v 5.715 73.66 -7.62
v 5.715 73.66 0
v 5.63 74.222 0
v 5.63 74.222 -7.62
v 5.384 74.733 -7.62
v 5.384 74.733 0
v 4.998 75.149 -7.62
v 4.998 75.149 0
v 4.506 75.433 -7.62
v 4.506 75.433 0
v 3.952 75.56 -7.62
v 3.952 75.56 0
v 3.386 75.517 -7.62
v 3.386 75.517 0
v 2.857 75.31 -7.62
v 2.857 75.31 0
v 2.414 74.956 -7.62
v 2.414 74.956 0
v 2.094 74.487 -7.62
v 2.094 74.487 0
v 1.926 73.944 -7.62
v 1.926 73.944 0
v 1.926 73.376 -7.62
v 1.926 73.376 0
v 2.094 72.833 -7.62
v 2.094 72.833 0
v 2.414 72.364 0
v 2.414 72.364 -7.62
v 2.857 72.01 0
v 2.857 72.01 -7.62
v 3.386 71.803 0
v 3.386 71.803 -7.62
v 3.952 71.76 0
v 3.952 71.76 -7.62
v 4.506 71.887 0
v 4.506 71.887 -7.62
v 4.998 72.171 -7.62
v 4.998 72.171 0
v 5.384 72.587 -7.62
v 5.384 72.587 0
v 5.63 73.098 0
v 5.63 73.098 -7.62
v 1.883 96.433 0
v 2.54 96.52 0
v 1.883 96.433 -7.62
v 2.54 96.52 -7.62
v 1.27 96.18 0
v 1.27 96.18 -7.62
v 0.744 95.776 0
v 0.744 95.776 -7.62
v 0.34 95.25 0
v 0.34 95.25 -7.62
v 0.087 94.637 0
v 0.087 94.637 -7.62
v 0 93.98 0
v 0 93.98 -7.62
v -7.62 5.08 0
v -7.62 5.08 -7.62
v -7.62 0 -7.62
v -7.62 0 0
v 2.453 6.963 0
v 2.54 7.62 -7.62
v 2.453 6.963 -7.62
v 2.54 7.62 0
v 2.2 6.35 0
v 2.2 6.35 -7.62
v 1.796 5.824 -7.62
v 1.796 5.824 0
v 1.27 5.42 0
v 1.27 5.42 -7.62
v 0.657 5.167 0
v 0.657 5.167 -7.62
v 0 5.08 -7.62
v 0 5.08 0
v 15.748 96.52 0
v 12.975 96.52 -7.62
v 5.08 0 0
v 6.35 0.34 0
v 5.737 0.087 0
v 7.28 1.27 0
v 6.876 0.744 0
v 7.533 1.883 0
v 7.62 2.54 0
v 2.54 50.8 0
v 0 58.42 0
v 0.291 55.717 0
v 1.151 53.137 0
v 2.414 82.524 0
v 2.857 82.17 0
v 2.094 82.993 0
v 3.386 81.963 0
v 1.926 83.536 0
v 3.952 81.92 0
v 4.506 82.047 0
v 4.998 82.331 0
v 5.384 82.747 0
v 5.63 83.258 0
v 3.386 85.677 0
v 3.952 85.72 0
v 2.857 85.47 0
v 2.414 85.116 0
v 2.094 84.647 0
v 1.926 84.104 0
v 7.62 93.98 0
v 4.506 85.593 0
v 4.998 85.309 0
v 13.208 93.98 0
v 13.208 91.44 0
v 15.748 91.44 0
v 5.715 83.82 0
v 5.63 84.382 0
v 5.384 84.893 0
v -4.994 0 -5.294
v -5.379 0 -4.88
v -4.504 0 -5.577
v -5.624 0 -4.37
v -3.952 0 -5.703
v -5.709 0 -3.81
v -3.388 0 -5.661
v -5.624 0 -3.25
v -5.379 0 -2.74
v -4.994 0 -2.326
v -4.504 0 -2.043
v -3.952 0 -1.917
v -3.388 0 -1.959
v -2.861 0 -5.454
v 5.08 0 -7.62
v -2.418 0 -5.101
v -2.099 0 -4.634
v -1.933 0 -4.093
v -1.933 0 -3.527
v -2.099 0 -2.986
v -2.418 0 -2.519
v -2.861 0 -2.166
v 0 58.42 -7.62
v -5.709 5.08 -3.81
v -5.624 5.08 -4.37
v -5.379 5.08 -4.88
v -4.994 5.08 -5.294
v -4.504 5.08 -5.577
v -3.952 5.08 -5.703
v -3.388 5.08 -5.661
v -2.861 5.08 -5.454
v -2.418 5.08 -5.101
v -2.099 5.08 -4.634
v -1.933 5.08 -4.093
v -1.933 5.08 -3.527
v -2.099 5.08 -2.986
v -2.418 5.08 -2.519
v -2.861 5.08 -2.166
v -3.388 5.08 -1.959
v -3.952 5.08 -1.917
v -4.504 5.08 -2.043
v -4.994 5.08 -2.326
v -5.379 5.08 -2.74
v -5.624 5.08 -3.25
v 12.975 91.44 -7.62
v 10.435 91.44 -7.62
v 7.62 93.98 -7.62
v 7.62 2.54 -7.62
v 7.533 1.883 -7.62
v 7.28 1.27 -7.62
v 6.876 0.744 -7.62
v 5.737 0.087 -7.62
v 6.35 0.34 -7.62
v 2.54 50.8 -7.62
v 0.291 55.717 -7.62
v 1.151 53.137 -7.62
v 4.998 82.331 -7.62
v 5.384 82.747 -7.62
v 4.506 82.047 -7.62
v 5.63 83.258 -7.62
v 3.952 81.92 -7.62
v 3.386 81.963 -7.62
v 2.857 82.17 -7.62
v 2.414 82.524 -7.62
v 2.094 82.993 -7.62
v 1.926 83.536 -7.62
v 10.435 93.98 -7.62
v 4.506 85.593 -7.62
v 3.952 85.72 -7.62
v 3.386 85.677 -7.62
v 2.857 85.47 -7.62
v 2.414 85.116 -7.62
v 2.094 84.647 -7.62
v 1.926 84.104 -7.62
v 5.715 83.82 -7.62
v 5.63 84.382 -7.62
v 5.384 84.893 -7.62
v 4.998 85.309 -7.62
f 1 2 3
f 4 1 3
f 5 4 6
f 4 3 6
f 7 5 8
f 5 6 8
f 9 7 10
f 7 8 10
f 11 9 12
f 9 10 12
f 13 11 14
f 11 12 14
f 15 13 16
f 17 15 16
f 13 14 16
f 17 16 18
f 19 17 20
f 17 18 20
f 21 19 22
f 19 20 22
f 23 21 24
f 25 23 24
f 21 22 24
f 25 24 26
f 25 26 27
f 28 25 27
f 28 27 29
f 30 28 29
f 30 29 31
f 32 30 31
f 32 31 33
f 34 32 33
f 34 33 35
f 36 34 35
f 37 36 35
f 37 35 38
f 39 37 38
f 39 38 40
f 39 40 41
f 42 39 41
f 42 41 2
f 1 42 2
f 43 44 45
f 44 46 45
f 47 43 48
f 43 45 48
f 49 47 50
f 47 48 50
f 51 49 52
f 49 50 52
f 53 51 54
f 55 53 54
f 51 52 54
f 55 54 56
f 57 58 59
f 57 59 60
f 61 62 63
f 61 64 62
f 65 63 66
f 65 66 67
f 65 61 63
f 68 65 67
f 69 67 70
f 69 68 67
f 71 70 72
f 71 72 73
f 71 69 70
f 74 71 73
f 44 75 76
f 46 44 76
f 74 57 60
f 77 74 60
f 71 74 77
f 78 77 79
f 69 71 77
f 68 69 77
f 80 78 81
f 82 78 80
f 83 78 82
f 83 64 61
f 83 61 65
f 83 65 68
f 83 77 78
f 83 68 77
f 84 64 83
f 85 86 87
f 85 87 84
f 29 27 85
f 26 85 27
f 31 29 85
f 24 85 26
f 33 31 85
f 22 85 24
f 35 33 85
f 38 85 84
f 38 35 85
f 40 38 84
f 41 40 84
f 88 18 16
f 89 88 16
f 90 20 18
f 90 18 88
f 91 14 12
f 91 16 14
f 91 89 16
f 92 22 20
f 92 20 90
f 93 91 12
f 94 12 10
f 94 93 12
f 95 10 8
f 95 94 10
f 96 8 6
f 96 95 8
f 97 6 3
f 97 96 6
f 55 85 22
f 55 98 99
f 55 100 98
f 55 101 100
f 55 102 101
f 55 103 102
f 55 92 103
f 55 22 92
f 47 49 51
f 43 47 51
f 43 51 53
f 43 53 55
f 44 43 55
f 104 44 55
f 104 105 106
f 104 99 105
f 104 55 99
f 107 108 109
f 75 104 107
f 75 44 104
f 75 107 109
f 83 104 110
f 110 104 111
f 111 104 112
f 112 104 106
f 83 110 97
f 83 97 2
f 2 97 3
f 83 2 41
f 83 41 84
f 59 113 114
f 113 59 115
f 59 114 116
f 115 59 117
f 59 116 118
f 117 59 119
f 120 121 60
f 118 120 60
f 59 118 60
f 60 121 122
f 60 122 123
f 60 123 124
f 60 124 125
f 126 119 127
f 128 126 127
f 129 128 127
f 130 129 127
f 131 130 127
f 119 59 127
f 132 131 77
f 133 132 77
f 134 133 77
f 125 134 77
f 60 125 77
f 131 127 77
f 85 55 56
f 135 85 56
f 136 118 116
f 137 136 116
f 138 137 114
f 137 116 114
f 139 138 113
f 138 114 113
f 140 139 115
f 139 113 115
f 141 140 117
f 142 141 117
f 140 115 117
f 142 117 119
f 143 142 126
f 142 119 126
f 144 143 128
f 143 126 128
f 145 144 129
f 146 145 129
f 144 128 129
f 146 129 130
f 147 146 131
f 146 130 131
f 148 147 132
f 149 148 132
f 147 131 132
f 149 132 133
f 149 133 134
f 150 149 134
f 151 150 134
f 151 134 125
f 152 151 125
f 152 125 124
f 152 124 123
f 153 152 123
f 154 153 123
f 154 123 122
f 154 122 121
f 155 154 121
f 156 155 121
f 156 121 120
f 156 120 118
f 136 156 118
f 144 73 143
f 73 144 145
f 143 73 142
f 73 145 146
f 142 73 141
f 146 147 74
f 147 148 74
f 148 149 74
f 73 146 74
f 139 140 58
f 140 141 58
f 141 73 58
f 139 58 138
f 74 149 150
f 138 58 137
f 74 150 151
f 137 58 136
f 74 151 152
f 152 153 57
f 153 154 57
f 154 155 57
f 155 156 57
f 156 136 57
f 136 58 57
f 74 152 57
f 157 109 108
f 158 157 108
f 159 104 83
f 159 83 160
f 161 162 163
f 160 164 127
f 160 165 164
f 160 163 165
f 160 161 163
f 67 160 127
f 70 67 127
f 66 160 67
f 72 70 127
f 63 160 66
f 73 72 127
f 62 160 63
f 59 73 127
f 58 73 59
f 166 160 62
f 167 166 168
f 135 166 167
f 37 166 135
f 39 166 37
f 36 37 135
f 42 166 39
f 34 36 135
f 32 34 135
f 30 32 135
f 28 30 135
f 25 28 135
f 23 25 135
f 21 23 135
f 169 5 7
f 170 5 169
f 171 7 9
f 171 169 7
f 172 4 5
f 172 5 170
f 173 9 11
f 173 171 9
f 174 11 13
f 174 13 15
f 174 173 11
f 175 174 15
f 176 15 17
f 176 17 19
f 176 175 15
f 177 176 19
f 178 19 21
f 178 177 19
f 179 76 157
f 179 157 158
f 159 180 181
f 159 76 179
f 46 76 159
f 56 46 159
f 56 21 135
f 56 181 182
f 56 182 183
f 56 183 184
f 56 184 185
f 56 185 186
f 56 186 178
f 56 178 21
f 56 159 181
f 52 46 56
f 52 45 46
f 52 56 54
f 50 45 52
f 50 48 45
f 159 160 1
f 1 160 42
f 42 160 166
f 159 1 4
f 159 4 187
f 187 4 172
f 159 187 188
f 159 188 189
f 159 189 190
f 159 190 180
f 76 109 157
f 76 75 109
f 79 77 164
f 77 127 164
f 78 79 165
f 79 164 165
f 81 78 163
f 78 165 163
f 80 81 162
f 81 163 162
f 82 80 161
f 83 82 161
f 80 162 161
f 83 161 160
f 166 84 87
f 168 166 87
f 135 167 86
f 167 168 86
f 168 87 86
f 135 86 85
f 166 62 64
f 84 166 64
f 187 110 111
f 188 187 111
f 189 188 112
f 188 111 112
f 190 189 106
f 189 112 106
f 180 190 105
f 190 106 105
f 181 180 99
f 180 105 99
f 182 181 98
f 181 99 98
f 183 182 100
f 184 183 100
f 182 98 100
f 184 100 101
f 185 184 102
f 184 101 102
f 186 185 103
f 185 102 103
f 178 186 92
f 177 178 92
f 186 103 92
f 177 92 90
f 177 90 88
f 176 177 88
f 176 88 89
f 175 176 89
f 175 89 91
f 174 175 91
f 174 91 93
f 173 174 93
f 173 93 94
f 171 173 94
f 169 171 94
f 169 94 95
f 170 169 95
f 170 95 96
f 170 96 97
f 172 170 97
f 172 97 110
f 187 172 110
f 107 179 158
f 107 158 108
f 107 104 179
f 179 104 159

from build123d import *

# Parameters (mm, degrees)
SKETCH1_W             = 7.62
SKETCH1_H             = 96.52
BOSS_EXTRUDE1_DEPTH   = 7.62
SKETCH2_W             = 7.62
SKETCH2_H             = 5.08
BOSS_EXTRUDE2_DEPTH   = 7.62
SKETCH4_W             = 7.62
SKETCH4_H             = 2.54
BOSS_EXTRUDE3_DEPTH   = 8.128
BOSS_EXTRUDE4_DEPTH   = 2.54
F_6_CLEARANCE_HOLE1_D = 3.7973
CUT_EXTRUDE1_DEPTH    = 2.54
SKETCH12_W            = 7.62
SKETCH12_H            = 45.72
CUT_EXTRUDE2_DEPTH    = 2.54
FILLET2_R             = 12.7
FILLET3_R             = 2.54
SKETCH14_R            = 1.905
CUT_EXTRUDE4_DEPTH    = 99.092682214


with BuildPart() as part:
    # Sketch1 → Boss-Extrude1 (new body)
    with BuildSketch(Plane(origin=(0, 0, 0), x_dir=(0, 0, -1), z_dir=(1, 0, 0))):
        with Locations((3.81, 48.26)):
            Rectangle(SKETCH1_W, SKETCH1_H)
    extrude(amount=BOSS_EXTRUDE1_DEPTH)

    # Sketch2 → Boss-Extrude2 (add)
    with BuildSketch(Plane.ZY):
        with Locations((-3.81, 2.54)):
            Rectangle(SKETCH2_W, SKETCH2_H)
    extrude(amount=BOSS_EXTRUDE2_DEPTH)

    # Sketch4 → Boss-Extrude3 (add)
    with BuildSketch(Plane(origin=(7.62, 0, 0), x_dir=(0, 0, -1), z_dir=(1, 0, 0))):
        with Locations((3.81, 95.25)):
            Rectangle(SKETCH4_W, SKETCH4_H)
    extrude(amount=BOSS_EXTRUDE3_DEPTH)

    # Sketch5 → Boss-Extrude4 (add)
    with BuildSketch(Plane.XZ.offset(-93.98)):
        Polygon((15.748, 0), (12.974546815, -7.62), (10.434546815, -7.62), (13.208, 0), align=None)
    extrude(amount=BOSS_EXTRUDE4_DEPTH)

    # #6 Clearance Hole1 (through all)
    with Locations(Plane(origin=(0, 5.08, 0), x_dir=(1, 0, 0), z_dir=(0, 1, 0))):
        with Locations((-3.81, 3.81)):
            Hole(F_6_CLEARANCE_HOLE1_D / 2)

    # Sketch8 → Cut-Extrude1 (cut)
    with BuildSketch(Plane.XZ.offset(-93.98)):
        Polygon((15.748, -7.62), (12.974546815, -7.62), (15.748, 0), align=None)
    extrude(amount=-CUT_EXTRUDE1_DEPTH, mode=Mode.SUBTRACT)

    # Sketch12 → Cut-Extrude2 (cut)
    with BuildSketch(Plane.ZY):
        with Locations((-3.81, 27.94)):
            Rectangle(SKETCH12_W, SKETCH12_H)
    extrude(amount=-CUT_EXTRUDE2_DEPTH, mode=Mode.SUBTRACT)

    # Fillet2
    # the kernel refuses this fillet: 12.7 mm, written as the material it takes off along each edge
    with BuildSketch(Plane(origin=(0, 50.8, 19.05), x_dir=(1, 0, 0), z_dir=(0, 0, -1))) as fillet2_piece_1:
        with BuildLine():
            CenterArc((12.7, -7.62), FILLET2_R, 143.130102354, 36.869897646)
            Line((0, -7.62), (-0.254, -7.62))
            Line((-0.254, -7.62), (-0.254, 0))
            Line((-0.254, 0), (0, 0.254))
            ThreePointArc((0, 0.254), (1.27, 0.254), (2.3368, 0.1524))
            Line((2.3368, 0.1524), (2.54, 0))
        make_face()
    extrude(amount=45.72, mode=Mode.SUBTRACT)

    # Fillet3
    fillet3_edges = [part.edges().sort_by_distance(p)[0] for p in [
        (2.54, 5.08, -3.81),
        (7.62, 0, -3.81),
        (0, 96.52, -3.81),
    ]]
    fillet(fillet3_edges, radius=FILLET3_R)

    # Sketch14 → Cut-Extrude4 (cut, through all)
    with BuildSketch(Plane.XY):
        with Locations((3.81, 83.82)):
            Circle(SKETCH14_R)
        with Locations((3.81, 73.66)):
            Circle(SKETCH14_R)
    extrude(amount=-CUT_EXTRUDE4_DEPTH, mode=Mode.SUBTRACT)


solid = part.part
